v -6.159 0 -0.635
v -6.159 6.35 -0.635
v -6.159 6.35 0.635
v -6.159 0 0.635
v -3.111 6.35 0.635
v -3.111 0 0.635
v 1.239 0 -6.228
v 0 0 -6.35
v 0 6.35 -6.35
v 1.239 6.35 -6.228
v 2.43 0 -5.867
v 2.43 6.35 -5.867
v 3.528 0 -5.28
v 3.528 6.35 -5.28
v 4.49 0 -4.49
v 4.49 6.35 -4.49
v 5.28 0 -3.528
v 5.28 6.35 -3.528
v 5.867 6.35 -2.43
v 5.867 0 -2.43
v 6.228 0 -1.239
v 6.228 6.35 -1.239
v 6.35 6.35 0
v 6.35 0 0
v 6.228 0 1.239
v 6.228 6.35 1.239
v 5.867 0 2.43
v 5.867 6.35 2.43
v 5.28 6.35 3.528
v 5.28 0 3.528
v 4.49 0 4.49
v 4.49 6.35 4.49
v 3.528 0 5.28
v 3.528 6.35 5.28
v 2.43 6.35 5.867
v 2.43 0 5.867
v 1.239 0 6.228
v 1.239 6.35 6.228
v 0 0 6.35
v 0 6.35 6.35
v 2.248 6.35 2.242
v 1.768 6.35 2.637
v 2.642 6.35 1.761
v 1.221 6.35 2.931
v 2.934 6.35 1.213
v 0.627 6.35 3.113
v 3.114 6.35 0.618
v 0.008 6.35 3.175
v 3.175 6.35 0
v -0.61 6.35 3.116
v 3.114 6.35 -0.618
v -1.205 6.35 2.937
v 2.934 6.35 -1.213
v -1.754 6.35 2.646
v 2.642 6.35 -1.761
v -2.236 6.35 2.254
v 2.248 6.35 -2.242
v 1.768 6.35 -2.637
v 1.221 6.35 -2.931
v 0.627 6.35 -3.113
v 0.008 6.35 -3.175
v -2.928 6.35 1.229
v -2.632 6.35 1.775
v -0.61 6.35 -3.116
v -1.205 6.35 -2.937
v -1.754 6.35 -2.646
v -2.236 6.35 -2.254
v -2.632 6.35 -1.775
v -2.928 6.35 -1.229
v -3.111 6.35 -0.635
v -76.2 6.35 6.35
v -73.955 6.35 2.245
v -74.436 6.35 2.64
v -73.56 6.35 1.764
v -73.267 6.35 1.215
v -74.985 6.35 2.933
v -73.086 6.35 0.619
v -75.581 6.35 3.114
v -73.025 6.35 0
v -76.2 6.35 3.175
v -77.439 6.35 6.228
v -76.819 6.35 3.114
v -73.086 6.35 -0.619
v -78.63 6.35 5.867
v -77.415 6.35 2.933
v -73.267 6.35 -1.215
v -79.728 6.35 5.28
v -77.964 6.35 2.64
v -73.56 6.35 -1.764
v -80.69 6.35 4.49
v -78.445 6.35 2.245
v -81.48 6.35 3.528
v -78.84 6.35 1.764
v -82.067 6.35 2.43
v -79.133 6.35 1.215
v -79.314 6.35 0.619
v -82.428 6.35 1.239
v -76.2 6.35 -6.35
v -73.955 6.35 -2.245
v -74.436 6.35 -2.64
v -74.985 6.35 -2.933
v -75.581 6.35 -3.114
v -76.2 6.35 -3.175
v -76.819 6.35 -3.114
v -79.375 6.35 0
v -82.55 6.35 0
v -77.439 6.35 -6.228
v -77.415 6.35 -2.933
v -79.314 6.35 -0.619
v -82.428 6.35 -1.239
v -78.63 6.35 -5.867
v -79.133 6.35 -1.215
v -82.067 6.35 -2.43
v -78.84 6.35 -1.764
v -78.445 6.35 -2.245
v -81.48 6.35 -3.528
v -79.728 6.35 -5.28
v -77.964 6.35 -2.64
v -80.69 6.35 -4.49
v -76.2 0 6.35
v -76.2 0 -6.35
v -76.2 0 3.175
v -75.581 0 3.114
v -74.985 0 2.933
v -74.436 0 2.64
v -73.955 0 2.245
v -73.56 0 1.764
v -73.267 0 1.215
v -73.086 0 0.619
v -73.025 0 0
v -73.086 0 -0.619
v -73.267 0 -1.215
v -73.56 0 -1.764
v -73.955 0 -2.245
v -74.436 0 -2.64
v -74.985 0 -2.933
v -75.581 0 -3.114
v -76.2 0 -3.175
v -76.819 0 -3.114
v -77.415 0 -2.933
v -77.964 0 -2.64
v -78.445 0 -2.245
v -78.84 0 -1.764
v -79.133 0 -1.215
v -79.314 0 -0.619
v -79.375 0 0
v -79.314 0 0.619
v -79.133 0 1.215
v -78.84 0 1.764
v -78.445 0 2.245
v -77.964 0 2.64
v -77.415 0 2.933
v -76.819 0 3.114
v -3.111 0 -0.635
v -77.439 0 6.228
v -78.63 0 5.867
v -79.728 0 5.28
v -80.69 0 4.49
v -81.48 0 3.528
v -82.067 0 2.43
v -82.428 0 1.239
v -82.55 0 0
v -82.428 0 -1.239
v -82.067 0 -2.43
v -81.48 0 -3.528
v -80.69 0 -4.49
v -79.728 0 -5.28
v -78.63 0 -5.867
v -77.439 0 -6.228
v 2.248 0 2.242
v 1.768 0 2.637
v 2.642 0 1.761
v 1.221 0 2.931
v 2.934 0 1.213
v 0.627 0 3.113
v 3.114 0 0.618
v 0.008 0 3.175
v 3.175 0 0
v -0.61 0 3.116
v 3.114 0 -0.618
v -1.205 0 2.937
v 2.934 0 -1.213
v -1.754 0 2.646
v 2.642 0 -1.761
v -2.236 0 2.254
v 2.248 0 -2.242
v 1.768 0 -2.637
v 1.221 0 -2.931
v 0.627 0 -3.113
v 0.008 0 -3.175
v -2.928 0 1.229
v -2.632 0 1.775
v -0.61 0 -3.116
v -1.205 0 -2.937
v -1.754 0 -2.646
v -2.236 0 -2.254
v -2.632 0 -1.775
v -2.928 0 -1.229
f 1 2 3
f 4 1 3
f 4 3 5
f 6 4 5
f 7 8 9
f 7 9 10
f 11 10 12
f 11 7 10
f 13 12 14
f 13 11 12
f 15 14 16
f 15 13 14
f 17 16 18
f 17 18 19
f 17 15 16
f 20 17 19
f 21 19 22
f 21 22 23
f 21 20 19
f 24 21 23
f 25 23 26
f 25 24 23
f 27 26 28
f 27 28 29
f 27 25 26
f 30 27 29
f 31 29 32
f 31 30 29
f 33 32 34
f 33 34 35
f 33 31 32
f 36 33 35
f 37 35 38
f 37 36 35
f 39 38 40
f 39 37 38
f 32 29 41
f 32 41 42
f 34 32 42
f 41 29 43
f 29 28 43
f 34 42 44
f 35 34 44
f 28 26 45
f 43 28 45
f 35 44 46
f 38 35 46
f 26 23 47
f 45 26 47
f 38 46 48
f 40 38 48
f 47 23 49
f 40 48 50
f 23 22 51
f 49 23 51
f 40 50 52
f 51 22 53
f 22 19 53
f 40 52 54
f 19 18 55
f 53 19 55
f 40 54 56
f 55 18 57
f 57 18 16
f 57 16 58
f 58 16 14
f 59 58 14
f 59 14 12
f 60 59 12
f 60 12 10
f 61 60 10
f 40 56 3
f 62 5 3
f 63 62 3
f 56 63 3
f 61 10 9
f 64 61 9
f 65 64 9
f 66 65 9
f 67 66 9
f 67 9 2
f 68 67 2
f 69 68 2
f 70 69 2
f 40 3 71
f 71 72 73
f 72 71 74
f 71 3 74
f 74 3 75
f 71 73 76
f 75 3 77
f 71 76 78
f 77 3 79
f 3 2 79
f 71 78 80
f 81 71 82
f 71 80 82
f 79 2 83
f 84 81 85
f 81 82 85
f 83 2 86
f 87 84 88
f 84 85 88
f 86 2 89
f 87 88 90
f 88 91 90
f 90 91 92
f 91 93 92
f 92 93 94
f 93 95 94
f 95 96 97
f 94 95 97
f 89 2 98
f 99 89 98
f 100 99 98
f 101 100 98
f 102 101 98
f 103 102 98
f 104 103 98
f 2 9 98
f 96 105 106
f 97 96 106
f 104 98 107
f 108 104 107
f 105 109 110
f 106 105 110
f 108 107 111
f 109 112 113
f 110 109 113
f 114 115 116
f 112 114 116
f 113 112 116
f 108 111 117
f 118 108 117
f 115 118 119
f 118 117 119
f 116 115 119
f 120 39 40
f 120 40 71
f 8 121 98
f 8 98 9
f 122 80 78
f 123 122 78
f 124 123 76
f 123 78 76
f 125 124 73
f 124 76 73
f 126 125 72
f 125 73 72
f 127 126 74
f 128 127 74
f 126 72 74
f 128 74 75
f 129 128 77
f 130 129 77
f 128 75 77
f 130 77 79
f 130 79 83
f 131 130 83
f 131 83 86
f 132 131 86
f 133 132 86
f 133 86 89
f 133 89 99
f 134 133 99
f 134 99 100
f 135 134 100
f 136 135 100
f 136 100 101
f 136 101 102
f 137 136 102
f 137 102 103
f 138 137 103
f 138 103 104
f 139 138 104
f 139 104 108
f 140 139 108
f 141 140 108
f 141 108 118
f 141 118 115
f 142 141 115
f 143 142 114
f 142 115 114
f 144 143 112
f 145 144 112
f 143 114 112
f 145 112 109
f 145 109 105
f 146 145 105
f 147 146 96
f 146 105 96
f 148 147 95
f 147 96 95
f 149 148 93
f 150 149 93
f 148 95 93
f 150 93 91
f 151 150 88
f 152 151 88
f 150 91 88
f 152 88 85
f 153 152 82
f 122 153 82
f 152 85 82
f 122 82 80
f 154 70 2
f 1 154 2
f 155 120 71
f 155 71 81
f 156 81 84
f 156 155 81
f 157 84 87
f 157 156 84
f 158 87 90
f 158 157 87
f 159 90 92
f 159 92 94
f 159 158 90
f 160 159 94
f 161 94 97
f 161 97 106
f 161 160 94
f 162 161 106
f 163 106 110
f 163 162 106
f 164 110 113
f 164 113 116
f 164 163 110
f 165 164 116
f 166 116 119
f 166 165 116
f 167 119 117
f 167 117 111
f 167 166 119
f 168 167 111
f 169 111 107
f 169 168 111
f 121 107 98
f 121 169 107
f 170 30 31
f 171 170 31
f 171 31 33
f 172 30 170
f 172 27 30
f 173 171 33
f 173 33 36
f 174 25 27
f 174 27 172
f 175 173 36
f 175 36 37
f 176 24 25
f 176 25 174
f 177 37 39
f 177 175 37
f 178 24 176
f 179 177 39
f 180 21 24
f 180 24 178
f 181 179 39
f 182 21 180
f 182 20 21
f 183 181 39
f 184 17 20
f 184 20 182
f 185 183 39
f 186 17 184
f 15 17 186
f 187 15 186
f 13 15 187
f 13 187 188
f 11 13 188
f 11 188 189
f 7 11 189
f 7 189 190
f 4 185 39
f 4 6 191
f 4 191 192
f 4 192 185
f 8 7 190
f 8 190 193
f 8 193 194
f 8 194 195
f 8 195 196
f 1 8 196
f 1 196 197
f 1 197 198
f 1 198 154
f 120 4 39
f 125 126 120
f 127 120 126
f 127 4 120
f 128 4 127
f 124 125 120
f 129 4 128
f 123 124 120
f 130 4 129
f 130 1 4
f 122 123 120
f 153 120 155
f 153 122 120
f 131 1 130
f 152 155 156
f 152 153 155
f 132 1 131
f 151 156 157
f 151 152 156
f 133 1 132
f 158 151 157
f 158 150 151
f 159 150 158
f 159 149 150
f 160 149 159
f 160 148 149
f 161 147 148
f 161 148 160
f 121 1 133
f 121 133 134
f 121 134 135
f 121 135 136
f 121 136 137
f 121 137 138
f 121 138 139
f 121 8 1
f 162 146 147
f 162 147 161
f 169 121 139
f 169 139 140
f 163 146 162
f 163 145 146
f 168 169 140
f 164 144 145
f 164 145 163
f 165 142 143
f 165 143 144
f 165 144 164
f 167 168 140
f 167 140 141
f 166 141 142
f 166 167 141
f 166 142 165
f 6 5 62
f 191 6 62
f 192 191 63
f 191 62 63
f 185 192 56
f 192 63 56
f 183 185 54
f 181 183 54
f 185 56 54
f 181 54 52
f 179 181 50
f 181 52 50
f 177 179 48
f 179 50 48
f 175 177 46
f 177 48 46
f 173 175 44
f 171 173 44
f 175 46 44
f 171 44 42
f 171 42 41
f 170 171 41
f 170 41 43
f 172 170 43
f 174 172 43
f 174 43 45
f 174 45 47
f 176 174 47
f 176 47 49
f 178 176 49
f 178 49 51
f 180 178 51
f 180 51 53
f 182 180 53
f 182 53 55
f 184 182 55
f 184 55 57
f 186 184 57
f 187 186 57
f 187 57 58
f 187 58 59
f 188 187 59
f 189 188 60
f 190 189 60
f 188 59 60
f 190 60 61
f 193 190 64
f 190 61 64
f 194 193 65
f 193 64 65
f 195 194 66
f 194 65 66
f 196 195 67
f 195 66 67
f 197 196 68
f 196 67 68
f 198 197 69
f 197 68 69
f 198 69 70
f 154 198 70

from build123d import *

# Parameters (mm, degrees)
BOSS_EXTRUDE1_DEPTH = 6.35
CUT_EXTRUDE2_DEPTH  = 84.037024874
SKETCH4_R           = 3.175
CUT_EXTRUDE3_DEPTH  = 84.037024874


with BuildPart() as part:
    # Sketch1 → Boss-Extrude1 (new body)
    with BuildSketch(Plane(origin=(0, 0, 0), x_dir=(1, 0, 0), z_dir=(0, 1, 0))):
        with BuildLine():
            Line((0, -6.35), (-76.2, -6.35))
            ThreePointArc((-76.2, -6.35), (-82.55, 0), (-76.2, 6.35))
            Line((-76.2, 6.35), (0, 6.35))
            ThreePointArc((0, 6.35), (6.35, 0), (0, -6.35))
        make_face()
    extrude(amount=BOSS_EXTRUDE1_DEPTH)

    # Sketch3 → Cut-Extrude2 (cut, through all)
    with BuildSketch(Plane(origin=(0, 6.35, 0), x_dir=(1, 0, 0), z_dir=(0, 1, 0))):
        with BuildLine():
            Line((-3.110851973, 0.635), (-6.158851973, 0.635))
            Line((-6.158851973, 0.635), (-6.158851973, -0.635))
            Line((-6.158851973, -0.635), (-3.110851973, -0.635))
            ThreePointArc((-3.110851973, -0.635), (3.175, 0), (-3.110851973, 0.635))
        make_face()
    extrude(amount=-CUT_EXTRUDE2_DEPTH, mode=Mode.SUBTRACT)

    # Sketch4 → Cut-Extrude3 (cut, through all)
    with BuildSketch(Plane(origin=(0, 6.35, 0), x_dir=(1, 0, 0), z_dir=(0, 1, 0))):
        with Locations(Location((-76.2, 0, 0), (0, 0, 270))):
            Circle(SKETCH4_R)
    extrude(amount=-CUT_EXTRUDE3_DEPTH, mode=Mode.SUBTRACT)


solid = part.part
